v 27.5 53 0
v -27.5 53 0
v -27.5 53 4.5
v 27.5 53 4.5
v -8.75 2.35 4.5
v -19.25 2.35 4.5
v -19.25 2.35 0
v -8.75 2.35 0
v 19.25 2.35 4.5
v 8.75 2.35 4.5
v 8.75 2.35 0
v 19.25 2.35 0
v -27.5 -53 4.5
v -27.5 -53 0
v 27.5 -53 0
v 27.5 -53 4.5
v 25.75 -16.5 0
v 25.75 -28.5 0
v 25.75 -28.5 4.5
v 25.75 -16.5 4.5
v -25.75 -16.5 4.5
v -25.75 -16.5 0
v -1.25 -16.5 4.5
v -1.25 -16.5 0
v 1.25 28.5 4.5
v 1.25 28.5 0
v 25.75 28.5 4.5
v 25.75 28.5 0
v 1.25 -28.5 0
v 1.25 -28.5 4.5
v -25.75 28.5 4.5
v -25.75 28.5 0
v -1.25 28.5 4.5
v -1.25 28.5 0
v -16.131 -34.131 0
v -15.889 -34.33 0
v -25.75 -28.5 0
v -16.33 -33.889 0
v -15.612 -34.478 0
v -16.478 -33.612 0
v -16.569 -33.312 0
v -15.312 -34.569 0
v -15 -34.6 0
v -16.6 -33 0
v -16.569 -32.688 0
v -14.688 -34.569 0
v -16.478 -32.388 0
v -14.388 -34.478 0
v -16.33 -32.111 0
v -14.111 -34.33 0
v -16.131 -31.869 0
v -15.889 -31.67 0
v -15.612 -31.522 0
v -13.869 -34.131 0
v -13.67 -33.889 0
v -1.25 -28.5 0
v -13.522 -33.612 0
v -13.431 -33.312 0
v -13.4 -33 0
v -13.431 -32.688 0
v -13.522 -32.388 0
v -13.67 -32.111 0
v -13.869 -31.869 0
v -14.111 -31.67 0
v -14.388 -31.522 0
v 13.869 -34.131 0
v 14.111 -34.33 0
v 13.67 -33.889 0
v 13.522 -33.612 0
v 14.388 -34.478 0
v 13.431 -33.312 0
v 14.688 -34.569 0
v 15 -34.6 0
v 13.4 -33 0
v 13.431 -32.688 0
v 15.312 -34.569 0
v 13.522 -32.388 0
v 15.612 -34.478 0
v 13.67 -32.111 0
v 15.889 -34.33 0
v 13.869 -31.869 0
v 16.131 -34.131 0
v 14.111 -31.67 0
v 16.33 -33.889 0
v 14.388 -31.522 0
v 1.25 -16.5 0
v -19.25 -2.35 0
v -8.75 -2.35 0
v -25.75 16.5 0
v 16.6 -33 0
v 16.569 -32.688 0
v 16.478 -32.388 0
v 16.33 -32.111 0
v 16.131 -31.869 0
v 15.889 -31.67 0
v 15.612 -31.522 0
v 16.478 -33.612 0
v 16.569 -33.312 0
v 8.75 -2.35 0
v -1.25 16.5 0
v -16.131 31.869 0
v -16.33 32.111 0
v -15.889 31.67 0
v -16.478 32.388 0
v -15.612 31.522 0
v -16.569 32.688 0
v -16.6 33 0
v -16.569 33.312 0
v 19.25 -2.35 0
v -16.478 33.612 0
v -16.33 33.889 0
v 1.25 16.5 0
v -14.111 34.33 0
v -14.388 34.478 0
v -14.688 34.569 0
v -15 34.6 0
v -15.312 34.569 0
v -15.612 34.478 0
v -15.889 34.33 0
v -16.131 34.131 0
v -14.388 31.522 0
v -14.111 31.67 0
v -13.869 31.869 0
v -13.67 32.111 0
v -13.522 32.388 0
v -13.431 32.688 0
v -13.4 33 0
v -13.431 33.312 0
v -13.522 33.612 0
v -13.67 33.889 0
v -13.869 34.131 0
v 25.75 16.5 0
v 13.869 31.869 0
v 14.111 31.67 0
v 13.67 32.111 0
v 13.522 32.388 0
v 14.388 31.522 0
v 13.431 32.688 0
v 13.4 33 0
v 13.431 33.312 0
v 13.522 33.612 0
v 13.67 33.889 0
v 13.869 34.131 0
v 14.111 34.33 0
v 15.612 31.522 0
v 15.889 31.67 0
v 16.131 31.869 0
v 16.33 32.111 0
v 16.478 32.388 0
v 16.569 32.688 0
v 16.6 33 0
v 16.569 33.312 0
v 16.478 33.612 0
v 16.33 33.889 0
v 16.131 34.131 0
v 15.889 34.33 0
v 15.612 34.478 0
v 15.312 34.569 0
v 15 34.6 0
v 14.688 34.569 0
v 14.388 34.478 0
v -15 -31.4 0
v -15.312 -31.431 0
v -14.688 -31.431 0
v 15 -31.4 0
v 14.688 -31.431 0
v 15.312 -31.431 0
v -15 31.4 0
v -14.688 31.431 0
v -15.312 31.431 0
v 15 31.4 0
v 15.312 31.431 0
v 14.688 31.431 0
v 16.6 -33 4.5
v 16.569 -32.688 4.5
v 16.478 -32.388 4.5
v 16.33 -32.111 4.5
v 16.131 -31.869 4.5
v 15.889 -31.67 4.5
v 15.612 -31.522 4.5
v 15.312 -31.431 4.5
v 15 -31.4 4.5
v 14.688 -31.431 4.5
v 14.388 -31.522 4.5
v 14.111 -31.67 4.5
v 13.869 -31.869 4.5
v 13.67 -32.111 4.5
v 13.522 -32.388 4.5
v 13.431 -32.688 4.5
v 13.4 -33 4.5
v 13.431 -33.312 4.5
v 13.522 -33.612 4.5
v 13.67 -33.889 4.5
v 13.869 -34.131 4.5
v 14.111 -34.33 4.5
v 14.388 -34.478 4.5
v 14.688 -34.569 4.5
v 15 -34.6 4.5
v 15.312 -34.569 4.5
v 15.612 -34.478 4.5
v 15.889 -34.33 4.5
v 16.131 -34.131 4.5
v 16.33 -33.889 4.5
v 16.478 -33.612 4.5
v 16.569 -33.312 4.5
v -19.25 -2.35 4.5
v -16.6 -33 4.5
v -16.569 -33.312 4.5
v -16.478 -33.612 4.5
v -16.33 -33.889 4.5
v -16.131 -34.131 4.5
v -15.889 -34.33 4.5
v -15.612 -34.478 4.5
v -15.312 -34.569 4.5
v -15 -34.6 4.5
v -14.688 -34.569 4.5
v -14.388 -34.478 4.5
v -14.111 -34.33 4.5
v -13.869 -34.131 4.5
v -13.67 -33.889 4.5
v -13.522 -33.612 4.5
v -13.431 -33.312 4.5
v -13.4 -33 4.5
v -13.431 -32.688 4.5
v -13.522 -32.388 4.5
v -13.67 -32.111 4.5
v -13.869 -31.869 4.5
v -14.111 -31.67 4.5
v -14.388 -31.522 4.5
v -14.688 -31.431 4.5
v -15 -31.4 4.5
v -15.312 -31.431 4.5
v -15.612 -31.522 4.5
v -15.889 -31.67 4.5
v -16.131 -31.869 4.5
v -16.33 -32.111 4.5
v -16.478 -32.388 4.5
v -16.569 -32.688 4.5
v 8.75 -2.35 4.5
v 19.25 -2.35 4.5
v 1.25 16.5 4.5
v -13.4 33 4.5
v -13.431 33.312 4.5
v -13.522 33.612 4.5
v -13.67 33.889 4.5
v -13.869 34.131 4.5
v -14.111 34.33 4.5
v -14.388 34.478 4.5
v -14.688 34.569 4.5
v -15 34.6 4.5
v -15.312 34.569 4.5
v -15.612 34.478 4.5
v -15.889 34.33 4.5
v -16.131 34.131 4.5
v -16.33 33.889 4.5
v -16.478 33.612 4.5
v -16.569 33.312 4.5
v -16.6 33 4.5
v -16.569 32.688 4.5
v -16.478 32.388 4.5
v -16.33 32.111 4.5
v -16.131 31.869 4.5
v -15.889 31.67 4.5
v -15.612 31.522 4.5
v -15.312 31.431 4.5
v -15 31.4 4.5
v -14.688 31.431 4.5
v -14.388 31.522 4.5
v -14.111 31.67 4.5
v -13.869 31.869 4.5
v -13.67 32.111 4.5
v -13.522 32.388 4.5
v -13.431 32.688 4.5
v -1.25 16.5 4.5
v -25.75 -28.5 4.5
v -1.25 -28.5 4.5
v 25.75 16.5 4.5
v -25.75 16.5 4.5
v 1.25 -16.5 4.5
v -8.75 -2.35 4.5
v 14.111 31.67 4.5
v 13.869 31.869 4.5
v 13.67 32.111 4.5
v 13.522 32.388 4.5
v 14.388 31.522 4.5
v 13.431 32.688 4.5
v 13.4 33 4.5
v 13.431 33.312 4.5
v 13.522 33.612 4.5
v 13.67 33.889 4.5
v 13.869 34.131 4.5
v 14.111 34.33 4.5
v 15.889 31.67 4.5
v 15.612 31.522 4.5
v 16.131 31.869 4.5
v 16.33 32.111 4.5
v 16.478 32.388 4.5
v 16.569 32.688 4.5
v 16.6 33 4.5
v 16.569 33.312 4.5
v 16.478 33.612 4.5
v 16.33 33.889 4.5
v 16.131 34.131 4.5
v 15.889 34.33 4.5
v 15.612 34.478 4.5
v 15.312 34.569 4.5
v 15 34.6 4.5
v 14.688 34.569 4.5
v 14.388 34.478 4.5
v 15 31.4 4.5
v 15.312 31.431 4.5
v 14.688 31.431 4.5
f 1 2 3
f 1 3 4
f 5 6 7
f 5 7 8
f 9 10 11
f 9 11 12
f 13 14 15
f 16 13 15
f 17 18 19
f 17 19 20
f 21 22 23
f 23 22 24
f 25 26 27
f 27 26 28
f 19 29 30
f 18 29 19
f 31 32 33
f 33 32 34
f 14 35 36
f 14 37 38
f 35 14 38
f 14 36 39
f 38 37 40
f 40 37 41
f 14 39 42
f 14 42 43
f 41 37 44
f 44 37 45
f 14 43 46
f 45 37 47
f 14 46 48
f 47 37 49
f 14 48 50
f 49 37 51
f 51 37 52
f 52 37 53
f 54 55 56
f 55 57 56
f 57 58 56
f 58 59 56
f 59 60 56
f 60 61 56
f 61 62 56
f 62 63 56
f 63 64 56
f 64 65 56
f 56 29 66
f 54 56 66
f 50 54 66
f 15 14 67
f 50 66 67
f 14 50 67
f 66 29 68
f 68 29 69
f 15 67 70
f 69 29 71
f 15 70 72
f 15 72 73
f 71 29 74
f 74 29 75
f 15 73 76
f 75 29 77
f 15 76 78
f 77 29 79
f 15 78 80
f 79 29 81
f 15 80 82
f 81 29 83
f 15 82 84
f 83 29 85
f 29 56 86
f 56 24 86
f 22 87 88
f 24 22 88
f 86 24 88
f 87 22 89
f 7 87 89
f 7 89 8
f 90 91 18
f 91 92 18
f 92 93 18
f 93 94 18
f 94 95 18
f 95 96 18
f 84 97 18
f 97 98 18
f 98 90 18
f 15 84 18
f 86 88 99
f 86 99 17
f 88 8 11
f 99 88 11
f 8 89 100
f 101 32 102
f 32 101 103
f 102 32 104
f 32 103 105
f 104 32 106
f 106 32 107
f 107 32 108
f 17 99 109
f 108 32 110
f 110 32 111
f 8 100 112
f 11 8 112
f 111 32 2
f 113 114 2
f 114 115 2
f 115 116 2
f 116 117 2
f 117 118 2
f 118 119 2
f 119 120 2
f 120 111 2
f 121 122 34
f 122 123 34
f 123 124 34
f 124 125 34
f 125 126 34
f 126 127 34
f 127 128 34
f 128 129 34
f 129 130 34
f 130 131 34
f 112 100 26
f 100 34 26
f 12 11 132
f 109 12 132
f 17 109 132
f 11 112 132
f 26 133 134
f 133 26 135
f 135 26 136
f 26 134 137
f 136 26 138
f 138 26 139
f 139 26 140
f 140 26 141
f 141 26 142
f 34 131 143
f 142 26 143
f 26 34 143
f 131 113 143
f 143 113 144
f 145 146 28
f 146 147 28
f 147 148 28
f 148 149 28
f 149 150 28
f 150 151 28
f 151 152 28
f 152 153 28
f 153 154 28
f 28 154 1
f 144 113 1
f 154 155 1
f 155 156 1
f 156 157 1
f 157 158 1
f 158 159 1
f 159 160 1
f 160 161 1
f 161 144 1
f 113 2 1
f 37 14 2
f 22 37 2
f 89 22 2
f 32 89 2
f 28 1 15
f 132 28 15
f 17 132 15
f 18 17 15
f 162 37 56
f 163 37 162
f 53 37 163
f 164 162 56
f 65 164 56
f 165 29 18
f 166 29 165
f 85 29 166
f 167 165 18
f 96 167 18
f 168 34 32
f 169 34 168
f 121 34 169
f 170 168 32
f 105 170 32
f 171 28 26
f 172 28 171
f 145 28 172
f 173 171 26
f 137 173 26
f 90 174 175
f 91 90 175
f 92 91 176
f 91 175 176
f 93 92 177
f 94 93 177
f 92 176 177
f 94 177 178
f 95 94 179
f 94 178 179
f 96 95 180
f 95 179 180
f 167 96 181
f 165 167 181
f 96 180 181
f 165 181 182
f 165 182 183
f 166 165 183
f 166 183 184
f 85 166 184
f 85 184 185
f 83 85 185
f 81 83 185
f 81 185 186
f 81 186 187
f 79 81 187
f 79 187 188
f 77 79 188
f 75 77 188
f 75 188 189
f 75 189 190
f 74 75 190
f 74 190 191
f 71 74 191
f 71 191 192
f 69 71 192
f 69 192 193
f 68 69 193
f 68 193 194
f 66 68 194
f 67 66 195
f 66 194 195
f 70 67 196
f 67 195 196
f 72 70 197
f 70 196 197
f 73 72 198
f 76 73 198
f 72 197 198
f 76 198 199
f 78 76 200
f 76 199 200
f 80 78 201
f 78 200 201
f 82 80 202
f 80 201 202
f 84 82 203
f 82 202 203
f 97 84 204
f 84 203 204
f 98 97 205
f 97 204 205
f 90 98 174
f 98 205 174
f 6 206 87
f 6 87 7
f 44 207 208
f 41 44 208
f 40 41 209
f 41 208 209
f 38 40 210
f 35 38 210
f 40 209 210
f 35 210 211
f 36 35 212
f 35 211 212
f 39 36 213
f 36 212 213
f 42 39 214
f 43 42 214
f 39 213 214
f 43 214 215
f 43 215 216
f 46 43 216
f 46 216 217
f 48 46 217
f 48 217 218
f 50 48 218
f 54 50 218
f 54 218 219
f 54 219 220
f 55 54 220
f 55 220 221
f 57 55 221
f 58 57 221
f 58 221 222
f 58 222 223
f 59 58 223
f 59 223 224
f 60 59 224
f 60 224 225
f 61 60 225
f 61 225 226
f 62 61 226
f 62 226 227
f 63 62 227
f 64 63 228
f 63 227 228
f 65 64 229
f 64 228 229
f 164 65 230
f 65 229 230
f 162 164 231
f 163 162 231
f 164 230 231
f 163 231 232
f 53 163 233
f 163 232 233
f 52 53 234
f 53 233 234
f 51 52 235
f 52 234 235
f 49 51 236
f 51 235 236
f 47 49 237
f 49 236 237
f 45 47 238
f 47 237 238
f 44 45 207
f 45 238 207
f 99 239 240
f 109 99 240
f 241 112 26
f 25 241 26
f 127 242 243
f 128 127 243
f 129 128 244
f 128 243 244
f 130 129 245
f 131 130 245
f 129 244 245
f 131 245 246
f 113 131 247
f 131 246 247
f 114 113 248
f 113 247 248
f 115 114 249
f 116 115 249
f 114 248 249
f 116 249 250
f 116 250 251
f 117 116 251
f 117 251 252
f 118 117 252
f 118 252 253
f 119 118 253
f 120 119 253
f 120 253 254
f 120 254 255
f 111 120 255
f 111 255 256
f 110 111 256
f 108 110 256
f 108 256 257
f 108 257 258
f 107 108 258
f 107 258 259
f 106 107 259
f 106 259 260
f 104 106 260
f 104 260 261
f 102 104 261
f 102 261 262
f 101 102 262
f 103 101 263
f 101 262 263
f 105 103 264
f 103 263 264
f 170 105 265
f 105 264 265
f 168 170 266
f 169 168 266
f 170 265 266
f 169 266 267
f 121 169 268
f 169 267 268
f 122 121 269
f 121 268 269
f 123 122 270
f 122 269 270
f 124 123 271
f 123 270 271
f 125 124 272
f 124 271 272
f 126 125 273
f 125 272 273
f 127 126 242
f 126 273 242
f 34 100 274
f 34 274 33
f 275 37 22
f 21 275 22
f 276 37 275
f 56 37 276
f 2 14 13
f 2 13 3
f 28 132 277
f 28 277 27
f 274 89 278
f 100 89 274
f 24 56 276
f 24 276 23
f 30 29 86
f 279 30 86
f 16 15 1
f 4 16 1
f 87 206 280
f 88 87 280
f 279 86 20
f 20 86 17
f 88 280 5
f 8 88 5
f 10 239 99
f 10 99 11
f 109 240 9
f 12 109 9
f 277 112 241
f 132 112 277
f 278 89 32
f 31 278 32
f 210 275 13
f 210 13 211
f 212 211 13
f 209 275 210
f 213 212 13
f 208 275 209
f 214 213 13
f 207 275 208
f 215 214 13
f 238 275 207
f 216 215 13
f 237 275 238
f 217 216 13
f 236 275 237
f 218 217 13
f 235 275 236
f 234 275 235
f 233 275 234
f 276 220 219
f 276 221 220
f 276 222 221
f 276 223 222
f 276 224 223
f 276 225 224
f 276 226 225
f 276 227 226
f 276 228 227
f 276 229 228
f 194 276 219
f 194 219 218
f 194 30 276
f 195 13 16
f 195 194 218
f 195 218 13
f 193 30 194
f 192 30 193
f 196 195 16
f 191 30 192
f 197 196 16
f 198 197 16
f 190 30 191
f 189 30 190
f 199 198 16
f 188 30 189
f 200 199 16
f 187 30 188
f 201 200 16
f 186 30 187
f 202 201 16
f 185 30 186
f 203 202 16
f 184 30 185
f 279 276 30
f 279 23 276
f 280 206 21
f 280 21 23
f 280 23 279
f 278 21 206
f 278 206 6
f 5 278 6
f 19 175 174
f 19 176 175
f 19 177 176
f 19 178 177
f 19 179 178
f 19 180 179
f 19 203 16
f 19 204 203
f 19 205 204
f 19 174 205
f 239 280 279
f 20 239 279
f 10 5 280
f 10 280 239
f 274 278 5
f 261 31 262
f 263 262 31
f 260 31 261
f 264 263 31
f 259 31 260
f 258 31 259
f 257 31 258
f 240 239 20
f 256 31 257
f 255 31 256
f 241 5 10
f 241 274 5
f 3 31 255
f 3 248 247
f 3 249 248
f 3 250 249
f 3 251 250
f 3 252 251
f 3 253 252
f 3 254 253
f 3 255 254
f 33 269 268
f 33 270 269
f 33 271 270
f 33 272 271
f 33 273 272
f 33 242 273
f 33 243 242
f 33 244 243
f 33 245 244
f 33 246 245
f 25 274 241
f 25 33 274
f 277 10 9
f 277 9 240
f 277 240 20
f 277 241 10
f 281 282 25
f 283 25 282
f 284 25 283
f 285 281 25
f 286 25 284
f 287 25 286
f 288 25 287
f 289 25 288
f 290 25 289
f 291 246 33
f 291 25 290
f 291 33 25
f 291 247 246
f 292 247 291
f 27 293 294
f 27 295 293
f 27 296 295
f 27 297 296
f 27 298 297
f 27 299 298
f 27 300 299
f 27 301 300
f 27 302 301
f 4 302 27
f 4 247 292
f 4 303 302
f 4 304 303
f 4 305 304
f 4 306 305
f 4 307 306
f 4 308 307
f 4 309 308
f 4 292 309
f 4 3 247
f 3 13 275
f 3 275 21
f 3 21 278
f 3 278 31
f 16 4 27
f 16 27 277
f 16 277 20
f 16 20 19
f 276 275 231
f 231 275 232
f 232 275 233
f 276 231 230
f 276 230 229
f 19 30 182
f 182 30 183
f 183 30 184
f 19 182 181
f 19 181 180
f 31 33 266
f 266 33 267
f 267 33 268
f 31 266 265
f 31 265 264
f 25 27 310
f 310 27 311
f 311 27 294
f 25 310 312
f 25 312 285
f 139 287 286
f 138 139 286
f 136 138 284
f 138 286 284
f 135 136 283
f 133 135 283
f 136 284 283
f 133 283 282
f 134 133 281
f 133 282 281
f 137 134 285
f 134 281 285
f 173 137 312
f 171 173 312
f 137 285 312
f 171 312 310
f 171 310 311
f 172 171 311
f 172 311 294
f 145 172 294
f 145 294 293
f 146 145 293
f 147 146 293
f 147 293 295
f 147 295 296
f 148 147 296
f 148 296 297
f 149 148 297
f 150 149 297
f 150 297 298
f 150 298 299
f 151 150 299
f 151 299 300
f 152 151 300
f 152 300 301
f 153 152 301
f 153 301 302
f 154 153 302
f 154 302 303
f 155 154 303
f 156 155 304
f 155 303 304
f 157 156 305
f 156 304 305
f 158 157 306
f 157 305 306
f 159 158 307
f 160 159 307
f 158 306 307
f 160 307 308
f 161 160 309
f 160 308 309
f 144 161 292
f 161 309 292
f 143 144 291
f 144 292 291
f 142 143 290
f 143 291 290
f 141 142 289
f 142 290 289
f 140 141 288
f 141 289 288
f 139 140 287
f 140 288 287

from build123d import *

# Parameters (mm, degrees)
SKETCH1_W           = 55
SKETCH1_H           = 106
SKETCH1_W_2         = 24.5
SKETCH1_H_2         = 12
BOSS_EXTRUDE1_DEPTH = 4.5
SKETCH2_R           = 1.6
CUT_EXTRUDE1_DEPTH  = 60.879044749
SKETCH3_W           = 10.5
SKETCH3_H           = 4.7
CUT_EXTRUDE2_DEPTH  = 60.879044749


with BuildPart() as part:
    # Sketch1 → Boss-Extrude1 (new body)
    with BuildSketch(Plane.XY):
        Rectangle(SKETCH1_W, SKETCH1_H)
        with Locations((-13.5, 22.5)):
            Rectangle(SKETCH1_W_2, SKETCH1_H_2, mode=Mode.SUBTRACT)
        with Locations((13.5, 22.5)):
            Rectangle(SKETCH1_W_2, SKETCH1_H_2, mode=Mode.SUBTRACT)
        with Locations((13.5, -22.5)):
            Rectangle(SKETCH1_W_2, SKETCH1_H_2, mode=Mode.SUBTRACT)
        with Locations((-13.5, -22.5)):
            Rectangle(SKETCH1_W_2, SKETCH1_H_2, mode=Mode.SUBTRACT)
    extrude(amount=BOSS_EXTRUDE1_DEPTH)

    # Sketch2 → Cut-Extrude1 (cut, through all)
    with BuildSketch(Plane.XY.offset(4.5)):
        with Locations((-15, 33)):
            Circle(SKETCH2_R)
        with Locations(Location((15, 33, 0), (0, 0, 180))):
            Circle(SKETCH2_R)
        with Locations((15, -33)):
            Circle(SKETCH2_R)
        with Locations(Location((-15, -33, 0), (0, 0, 180))):
            Circle(SKETCH2_R)
    extrude(amount=-CUT_EXTRUDE1_DEPTH, mode=Mode.SUBTRACT)

    # Sketch3 → Cut-Extrude2 (cut, through all)
    with BuildSketch(Plane.XY.offset(4.5)):
        with Locations((-14, 0)):
            Rectangle(SKETCH3_W, SKETCH3_H)
        with Locations((14, 0)):
            Rectangle(SKETCH3_W, SKETCH3_H)
    extrude(amount=-CUT_EXTRUDE2_DEPTH, mode=Mode.SUBTRACT)


solid = part.part
